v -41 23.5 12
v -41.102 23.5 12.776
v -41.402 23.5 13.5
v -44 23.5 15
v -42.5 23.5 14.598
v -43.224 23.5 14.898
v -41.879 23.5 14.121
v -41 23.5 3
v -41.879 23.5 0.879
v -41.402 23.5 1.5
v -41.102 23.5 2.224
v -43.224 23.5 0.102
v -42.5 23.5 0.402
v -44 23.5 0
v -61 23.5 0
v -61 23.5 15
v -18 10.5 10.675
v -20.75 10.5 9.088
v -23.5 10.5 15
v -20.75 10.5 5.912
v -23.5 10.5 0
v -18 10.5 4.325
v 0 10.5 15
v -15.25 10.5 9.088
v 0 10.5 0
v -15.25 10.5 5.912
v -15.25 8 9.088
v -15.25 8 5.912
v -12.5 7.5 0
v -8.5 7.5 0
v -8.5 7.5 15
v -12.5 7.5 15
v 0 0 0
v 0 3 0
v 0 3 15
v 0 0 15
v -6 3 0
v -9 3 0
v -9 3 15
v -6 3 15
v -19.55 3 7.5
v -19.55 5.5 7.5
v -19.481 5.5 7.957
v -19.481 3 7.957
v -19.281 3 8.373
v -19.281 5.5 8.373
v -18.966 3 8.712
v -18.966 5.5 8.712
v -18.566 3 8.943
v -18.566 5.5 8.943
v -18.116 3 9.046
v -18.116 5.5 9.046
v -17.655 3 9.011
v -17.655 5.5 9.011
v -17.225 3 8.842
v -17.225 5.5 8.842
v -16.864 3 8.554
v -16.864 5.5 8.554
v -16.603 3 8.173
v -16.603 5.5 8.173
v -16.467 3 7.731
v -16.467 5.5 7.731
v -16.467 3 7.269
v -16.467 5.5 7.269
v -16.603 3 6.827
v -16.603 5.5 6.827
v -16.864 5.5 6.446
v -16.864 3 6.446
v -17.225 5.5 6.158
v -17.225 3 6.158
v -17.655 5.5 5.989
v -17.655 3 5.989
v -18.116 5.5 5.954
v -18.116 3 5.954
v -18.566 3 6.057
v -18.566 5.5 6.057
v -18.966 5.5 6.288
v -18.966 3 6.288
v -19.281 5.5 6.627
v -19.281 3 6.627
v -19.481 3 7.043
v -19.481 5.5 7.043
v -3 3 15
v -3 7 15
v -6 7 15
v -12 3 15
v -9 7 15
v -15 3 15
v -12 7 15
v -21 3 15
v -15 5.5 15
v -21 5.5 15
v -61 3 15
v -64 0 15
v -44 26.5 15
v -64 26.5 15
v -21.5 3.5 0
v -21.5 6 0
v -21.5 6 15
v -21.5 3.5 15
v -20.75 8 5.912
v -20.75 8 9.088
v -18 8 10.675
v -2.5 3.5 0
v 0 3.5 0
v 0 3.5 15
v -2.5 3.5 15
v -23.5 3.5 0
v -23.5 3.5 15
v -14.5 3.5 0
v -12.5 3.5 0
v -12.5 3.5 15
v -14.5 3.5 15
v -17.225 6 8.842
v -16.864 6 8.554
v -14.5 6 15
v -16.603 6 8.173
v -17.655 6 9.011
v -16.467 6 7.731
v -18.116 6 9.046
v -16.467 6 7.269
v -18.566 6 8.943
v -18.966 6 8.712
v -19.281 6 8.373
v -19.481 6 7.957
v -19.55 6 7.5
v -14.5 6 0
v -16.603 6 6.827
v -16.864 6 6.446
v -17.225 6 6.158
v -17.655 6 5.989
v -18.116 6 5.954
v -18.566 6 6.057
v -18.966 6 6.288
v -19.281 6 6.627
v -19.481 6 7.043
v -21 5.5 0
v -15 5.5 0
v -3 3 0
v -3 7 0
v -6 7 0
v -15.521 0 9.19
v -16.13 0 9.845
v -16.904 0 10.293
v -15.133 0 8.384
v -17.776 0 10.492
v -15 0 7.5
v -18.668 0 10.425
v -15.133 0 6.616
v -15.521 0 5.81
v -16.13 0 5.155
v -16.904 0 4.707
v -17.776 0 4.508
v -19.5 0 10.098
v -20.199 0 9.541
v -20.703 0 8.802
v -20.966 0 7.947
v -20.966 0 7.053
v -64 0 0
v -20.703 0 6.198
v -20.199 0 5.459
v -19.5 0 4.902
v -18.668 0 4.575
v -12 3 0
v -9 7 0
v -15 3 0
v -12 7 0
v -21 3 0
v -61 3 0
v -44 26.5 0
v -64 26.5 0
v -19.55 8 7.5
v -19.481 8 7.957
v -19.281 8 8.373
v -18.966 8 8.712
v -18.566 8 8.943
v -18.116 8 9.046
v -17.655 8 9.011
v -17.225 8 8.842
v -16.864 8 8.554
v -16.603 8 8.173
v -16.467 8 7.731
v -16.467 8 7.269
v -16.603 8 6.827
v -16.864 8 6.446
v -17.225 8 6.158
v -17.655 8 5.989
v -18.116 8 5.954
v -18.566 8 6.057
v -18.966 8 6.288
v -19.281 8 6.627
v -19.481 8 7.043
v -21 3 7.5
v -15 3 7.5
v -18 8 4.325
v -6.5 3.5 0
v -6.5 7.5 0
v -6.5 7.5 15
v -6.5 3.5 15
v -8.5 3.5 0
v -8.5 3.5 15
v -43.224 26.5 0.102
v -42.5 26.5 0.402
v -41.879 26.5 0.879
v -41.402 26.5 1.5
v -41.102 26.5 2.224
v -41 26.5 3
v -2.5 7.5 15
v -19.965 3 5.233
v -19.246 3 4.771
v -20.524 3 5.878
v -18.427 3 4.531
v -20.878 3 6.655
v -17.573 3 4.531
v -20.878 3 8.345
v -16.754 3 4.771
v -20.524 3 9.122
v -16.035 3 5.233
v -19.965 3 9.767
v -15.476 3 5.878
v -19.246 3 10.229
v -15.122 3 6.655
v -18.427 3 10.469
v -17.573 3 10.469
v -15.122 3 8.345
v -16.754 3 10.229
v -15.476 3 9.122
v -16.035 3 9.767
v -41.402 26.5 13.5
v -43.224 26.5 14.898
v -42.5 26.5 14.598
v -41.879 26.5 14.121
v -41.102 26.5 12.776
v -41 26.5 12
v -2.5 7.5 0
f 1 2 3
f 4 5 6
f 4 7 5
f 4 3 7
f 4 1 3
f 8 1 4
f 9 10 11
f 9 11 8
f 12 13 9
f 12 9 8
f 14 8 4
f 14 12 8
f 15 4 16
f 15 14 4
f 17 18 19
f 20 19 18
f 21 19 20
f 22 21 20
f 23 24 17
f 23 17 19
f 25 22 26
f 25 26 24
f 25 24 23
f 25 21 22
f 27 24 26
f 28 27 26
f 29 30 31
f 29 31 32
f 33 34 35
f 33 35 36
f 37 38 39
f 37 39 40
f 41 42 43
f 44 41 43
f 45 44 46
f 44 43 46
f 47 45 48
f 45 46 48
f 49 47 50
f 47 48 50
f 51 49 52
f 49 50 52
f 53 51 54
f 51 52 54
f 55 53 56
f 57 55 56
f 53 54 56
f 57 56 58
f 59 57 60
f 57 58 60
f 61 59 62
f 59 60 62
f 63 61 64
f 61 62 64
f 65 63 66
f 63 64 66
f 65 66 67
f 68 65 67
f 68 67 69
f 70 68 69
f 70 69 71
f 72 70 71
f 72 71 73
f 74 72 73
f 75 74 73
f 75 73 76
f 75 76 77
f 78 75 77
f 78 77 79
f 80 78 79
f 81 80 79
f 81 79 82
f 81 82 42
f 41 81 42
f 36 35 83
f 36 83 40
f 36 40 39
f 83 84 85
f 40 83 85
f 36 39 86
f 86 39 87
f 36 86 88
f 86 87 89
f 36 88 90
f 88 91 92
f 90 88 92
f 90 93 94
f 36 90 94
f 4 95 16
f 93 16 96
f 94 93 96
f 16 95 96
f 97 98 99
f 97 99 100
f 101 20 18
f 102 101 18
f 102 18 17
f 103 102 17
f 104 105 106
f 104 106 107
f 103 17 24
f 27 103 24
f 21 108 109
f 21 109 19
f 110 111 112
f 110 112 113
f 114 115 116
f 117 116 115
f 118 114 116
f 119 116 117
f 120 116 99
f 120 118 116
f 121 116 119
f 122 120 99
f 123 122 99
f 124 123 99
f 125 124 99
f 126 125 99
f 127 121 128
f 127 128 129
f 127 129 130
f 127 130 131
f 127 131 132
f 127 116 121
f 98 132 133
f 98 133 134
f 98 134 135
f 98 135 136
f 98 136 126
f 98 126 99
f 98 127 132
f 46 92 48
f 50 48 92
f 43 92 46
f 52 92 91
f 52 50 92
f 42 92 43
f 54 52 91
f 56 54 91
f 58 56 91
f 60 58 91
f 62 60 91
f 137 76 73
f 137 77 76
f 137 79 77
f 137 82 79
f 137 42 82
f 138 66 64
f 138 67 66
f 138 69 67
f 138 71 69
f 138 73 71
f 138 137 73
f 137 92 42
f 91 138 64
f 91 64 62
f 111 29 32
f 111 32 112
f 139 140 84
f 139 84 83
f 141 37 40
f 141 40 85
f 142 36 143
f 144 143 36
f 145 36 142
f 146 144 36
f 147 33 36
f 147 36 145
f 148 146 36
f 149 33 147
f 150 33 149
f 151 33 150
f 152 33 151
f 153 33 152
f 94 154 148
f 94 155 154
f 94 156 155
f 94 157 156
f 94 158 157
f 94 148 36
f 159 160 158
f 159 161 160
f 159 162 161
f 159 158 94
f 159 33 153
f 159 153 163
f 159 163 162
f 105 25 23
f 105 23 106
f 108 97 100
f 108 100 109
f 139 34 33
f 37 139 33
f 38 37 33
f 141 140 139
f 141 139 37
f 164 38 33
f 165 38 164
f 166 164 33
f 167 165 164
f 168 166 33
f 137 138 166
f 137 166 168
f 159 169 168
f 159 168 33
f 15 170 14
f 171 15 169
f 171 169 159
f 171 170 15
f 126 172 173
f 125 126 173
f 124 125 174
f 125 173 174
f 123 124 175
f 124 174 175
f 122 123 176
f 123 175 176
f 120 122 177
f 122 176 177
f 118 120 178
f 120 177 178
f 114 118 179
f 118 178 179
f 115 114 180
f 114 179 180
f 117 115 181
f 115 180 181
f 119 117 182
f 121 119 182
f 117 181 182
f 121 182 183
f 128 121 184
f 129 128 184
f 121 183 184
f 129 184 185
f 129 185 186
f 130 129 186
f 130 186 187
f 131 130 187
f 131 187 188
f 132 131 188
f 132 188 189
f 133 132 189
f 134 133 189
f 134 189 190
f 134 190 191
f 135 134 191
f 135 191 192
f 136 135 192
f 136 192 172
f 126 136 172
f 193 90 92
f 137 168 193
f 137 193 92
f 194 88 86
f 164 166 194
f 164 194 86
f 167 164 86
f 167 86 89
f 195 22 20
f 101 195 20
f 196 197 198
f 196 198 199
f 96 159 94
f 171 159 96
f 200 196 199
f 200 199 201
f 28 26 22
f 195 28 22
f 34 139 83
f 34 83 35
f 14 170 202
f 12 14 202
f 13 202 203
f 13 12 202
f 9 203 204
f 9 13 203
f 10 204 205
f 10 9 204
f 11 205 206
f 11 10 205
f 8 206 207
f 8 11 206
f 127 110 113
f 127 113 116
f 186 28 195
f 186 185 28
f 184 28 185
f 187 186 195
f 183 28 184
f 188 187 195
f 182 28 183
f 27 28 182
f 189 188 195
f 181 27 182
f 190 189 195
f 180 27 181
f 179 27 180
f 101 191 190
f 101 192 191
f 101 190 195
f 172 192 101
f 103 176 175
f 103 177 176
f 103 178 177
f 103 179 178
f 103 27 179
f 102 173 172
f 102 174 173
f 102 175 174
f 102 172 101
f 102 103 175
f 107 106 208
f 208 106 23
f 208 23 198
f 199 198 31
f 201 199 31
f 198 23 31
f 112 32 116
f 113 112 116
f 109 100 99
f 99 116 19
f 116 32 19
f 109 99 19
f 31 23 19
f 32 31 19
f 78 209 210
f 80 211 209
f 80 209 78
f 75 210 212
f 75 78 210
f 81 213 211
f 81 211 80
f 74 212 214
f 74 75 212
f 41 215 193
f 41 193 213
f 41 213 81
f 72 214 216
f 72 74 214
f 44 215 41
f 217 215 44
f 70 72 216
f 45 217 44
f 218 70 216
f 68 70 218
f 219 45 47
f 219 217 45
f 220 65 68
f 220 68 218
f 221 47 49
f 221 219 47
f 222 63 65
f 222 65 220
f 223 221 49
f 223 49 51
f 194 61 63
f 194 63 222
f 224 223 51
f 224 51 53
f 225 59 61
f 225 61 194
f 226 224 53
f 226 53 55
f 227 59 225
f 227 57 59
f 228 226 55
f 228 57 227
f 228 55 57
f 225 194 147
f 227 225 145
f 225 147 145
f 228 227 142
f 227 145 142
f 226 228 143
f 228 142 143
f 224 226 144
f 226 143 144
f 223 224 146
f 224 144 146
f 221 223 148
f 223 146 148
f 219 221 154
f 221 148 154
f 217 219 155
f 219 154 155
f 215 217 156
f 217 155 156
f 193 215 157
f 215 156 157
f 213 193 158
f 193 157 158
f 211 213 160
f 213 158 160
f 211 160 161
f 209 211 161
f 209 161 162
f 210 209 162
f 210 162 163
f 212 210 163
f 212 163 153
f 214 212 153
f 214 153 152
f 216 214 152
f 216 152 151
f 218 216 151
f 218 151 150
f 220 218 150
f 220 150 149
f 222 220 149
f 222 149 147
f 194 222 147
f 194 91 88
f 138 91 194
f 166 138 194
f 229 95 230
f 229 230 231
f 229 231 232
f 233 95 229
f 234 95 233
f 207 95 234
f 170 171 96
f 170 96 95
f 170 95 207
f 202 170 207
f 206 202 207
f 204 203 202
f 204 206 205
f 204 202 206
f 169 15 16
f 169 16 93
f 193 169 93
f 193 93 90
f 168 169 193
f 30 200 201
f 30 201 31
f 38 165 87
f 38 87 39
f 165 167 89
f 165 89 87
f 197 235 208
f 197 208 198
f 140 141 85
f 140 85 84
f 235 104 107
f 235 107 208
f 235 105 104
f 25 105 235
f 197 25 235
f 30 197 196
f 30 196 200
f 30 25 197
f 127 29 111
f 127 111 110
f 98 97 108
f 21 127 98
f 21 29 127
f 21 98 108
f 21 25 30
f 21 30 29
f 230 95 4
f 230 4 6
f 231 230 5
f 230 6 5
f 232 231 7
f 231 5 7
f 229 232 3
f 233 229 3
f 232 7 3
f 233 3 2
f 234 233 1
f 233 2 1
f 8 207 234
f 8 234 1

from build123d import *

# Parameters (mm, degrees)
PAD_DEPTH       = 15
SKETCH001_R     = 1.55
POCKET_DEPTH    = 5.501
SKETCH002_R     = 3
POCKET001_DEPTH = 3
FILLET_R        = 3
PAD001_DEPTH    = 15
SKETCH004_R     = 1.55
POCKET002_DEPTH = 5
POCKET003_DEPTH = 2.5


with BuildPart() as k_rper:
    # Sketch → Pad (new body)
    with BuildSketch(Plane.XY):
        Polygon((0, 0), (-64, 0), (-64, 26.5), (-41, 26.5), (-41, 23.5), (-61, 23.5), (-61, 3), (-21, 3), (-21, 5.5), (-15, 5.5), (-15, 3), (-12, 3), (-12, 7), (-9, 7), (-9, 3), (-6, 3), (-6, 7), (-3, 7), (-3, 3), (0, 3), align=None)
    extrude(amount=PAD_DEPTH)

    # Sketch001 (on Face9 of Pad) → Pocket (cut, through all)
    with BuildSketch(Plane(origin=(0, 5.5, 0), x_dir=(-1, 0, 0), z_dir=(0, 1, 0))):
        with Locations((18, 7.5)):
            Circle(SKETCH001_R)
    extrude(amount=-POCKET_DEPTH, mode=Mode.SUBTRACT)

    # Sketch002 (on Face1 of Pocket) → Pocket001 (cut)
    with BuildSketch(Plane.XZ):
        with Locations((-18, 7.5)):
            Circle(SKETCH002_R)
    extrude(amount=-POCKET001_DEPTH, mode=Mode.SUBTRACT)

    # Fillet
    fillet_edges = [k_rper.edges().sort_by_distance(p)[0] for p in [
        (-41, 25, 0),
        (-41, 25, 15),
    ]]
    fillet(fillet_edges, radius=FILLET_R)


with BuildPart() as gegenklemme:
    # Sketch003 → Pad001 (new body)
    with BuildSketch(Plane.XY):
        Polygon((0, 3.5), (-2.5, 3.5), (-2.5, 7.5), (-6.5, 7.5), (-6.5, 3.5), (-8.5, 3.5), (-8.5, 7.5), (-12.5, 7.5), (-12.5, 3.5), (-14.5, 3.5), (-14.5, 6), (-21.5, 6), (-21.5, 3.5), (-23.5, 3.5), (-23.5, 10.5), (0, 10.5), align=None)
    extrude(amount=PAD001_DEPTH)

    # Sketch004 (on Face15 of Pad001) → Pocket002 (cut)
    with BuildSketch(Plane(origin=(0, 10.5, 0), x_dir=(-1, 0, 0), z_dir=(0, 1, 0))):
        with Locations((18, 7.5)):
            Circle(SKETCH004_R)
    extrude(amount=-POCKET002_DEPTH, mode=Mode.SUBTRACT)

    # Sketch005 (on Face6 of Pocket002) → Pocket003 (cut)
    with BuildSketch(Plane(origin=(0, 10.5, 0), x_dir=(-1, 0, 0), z_dir=(0, 1, 0))):
        Polygon((20.75, 5.912287), (20.75, 9.087713), (18, 10.675426), (15.25, 9.087713), (15.25, 5.912287), (18, 4.324574), align=None)
    extrude(amount=-POCKET003_DEPTH, mode=Mode.SUBTRACT)


solid = Compound([k_rper.part, gegenklemme.part])
